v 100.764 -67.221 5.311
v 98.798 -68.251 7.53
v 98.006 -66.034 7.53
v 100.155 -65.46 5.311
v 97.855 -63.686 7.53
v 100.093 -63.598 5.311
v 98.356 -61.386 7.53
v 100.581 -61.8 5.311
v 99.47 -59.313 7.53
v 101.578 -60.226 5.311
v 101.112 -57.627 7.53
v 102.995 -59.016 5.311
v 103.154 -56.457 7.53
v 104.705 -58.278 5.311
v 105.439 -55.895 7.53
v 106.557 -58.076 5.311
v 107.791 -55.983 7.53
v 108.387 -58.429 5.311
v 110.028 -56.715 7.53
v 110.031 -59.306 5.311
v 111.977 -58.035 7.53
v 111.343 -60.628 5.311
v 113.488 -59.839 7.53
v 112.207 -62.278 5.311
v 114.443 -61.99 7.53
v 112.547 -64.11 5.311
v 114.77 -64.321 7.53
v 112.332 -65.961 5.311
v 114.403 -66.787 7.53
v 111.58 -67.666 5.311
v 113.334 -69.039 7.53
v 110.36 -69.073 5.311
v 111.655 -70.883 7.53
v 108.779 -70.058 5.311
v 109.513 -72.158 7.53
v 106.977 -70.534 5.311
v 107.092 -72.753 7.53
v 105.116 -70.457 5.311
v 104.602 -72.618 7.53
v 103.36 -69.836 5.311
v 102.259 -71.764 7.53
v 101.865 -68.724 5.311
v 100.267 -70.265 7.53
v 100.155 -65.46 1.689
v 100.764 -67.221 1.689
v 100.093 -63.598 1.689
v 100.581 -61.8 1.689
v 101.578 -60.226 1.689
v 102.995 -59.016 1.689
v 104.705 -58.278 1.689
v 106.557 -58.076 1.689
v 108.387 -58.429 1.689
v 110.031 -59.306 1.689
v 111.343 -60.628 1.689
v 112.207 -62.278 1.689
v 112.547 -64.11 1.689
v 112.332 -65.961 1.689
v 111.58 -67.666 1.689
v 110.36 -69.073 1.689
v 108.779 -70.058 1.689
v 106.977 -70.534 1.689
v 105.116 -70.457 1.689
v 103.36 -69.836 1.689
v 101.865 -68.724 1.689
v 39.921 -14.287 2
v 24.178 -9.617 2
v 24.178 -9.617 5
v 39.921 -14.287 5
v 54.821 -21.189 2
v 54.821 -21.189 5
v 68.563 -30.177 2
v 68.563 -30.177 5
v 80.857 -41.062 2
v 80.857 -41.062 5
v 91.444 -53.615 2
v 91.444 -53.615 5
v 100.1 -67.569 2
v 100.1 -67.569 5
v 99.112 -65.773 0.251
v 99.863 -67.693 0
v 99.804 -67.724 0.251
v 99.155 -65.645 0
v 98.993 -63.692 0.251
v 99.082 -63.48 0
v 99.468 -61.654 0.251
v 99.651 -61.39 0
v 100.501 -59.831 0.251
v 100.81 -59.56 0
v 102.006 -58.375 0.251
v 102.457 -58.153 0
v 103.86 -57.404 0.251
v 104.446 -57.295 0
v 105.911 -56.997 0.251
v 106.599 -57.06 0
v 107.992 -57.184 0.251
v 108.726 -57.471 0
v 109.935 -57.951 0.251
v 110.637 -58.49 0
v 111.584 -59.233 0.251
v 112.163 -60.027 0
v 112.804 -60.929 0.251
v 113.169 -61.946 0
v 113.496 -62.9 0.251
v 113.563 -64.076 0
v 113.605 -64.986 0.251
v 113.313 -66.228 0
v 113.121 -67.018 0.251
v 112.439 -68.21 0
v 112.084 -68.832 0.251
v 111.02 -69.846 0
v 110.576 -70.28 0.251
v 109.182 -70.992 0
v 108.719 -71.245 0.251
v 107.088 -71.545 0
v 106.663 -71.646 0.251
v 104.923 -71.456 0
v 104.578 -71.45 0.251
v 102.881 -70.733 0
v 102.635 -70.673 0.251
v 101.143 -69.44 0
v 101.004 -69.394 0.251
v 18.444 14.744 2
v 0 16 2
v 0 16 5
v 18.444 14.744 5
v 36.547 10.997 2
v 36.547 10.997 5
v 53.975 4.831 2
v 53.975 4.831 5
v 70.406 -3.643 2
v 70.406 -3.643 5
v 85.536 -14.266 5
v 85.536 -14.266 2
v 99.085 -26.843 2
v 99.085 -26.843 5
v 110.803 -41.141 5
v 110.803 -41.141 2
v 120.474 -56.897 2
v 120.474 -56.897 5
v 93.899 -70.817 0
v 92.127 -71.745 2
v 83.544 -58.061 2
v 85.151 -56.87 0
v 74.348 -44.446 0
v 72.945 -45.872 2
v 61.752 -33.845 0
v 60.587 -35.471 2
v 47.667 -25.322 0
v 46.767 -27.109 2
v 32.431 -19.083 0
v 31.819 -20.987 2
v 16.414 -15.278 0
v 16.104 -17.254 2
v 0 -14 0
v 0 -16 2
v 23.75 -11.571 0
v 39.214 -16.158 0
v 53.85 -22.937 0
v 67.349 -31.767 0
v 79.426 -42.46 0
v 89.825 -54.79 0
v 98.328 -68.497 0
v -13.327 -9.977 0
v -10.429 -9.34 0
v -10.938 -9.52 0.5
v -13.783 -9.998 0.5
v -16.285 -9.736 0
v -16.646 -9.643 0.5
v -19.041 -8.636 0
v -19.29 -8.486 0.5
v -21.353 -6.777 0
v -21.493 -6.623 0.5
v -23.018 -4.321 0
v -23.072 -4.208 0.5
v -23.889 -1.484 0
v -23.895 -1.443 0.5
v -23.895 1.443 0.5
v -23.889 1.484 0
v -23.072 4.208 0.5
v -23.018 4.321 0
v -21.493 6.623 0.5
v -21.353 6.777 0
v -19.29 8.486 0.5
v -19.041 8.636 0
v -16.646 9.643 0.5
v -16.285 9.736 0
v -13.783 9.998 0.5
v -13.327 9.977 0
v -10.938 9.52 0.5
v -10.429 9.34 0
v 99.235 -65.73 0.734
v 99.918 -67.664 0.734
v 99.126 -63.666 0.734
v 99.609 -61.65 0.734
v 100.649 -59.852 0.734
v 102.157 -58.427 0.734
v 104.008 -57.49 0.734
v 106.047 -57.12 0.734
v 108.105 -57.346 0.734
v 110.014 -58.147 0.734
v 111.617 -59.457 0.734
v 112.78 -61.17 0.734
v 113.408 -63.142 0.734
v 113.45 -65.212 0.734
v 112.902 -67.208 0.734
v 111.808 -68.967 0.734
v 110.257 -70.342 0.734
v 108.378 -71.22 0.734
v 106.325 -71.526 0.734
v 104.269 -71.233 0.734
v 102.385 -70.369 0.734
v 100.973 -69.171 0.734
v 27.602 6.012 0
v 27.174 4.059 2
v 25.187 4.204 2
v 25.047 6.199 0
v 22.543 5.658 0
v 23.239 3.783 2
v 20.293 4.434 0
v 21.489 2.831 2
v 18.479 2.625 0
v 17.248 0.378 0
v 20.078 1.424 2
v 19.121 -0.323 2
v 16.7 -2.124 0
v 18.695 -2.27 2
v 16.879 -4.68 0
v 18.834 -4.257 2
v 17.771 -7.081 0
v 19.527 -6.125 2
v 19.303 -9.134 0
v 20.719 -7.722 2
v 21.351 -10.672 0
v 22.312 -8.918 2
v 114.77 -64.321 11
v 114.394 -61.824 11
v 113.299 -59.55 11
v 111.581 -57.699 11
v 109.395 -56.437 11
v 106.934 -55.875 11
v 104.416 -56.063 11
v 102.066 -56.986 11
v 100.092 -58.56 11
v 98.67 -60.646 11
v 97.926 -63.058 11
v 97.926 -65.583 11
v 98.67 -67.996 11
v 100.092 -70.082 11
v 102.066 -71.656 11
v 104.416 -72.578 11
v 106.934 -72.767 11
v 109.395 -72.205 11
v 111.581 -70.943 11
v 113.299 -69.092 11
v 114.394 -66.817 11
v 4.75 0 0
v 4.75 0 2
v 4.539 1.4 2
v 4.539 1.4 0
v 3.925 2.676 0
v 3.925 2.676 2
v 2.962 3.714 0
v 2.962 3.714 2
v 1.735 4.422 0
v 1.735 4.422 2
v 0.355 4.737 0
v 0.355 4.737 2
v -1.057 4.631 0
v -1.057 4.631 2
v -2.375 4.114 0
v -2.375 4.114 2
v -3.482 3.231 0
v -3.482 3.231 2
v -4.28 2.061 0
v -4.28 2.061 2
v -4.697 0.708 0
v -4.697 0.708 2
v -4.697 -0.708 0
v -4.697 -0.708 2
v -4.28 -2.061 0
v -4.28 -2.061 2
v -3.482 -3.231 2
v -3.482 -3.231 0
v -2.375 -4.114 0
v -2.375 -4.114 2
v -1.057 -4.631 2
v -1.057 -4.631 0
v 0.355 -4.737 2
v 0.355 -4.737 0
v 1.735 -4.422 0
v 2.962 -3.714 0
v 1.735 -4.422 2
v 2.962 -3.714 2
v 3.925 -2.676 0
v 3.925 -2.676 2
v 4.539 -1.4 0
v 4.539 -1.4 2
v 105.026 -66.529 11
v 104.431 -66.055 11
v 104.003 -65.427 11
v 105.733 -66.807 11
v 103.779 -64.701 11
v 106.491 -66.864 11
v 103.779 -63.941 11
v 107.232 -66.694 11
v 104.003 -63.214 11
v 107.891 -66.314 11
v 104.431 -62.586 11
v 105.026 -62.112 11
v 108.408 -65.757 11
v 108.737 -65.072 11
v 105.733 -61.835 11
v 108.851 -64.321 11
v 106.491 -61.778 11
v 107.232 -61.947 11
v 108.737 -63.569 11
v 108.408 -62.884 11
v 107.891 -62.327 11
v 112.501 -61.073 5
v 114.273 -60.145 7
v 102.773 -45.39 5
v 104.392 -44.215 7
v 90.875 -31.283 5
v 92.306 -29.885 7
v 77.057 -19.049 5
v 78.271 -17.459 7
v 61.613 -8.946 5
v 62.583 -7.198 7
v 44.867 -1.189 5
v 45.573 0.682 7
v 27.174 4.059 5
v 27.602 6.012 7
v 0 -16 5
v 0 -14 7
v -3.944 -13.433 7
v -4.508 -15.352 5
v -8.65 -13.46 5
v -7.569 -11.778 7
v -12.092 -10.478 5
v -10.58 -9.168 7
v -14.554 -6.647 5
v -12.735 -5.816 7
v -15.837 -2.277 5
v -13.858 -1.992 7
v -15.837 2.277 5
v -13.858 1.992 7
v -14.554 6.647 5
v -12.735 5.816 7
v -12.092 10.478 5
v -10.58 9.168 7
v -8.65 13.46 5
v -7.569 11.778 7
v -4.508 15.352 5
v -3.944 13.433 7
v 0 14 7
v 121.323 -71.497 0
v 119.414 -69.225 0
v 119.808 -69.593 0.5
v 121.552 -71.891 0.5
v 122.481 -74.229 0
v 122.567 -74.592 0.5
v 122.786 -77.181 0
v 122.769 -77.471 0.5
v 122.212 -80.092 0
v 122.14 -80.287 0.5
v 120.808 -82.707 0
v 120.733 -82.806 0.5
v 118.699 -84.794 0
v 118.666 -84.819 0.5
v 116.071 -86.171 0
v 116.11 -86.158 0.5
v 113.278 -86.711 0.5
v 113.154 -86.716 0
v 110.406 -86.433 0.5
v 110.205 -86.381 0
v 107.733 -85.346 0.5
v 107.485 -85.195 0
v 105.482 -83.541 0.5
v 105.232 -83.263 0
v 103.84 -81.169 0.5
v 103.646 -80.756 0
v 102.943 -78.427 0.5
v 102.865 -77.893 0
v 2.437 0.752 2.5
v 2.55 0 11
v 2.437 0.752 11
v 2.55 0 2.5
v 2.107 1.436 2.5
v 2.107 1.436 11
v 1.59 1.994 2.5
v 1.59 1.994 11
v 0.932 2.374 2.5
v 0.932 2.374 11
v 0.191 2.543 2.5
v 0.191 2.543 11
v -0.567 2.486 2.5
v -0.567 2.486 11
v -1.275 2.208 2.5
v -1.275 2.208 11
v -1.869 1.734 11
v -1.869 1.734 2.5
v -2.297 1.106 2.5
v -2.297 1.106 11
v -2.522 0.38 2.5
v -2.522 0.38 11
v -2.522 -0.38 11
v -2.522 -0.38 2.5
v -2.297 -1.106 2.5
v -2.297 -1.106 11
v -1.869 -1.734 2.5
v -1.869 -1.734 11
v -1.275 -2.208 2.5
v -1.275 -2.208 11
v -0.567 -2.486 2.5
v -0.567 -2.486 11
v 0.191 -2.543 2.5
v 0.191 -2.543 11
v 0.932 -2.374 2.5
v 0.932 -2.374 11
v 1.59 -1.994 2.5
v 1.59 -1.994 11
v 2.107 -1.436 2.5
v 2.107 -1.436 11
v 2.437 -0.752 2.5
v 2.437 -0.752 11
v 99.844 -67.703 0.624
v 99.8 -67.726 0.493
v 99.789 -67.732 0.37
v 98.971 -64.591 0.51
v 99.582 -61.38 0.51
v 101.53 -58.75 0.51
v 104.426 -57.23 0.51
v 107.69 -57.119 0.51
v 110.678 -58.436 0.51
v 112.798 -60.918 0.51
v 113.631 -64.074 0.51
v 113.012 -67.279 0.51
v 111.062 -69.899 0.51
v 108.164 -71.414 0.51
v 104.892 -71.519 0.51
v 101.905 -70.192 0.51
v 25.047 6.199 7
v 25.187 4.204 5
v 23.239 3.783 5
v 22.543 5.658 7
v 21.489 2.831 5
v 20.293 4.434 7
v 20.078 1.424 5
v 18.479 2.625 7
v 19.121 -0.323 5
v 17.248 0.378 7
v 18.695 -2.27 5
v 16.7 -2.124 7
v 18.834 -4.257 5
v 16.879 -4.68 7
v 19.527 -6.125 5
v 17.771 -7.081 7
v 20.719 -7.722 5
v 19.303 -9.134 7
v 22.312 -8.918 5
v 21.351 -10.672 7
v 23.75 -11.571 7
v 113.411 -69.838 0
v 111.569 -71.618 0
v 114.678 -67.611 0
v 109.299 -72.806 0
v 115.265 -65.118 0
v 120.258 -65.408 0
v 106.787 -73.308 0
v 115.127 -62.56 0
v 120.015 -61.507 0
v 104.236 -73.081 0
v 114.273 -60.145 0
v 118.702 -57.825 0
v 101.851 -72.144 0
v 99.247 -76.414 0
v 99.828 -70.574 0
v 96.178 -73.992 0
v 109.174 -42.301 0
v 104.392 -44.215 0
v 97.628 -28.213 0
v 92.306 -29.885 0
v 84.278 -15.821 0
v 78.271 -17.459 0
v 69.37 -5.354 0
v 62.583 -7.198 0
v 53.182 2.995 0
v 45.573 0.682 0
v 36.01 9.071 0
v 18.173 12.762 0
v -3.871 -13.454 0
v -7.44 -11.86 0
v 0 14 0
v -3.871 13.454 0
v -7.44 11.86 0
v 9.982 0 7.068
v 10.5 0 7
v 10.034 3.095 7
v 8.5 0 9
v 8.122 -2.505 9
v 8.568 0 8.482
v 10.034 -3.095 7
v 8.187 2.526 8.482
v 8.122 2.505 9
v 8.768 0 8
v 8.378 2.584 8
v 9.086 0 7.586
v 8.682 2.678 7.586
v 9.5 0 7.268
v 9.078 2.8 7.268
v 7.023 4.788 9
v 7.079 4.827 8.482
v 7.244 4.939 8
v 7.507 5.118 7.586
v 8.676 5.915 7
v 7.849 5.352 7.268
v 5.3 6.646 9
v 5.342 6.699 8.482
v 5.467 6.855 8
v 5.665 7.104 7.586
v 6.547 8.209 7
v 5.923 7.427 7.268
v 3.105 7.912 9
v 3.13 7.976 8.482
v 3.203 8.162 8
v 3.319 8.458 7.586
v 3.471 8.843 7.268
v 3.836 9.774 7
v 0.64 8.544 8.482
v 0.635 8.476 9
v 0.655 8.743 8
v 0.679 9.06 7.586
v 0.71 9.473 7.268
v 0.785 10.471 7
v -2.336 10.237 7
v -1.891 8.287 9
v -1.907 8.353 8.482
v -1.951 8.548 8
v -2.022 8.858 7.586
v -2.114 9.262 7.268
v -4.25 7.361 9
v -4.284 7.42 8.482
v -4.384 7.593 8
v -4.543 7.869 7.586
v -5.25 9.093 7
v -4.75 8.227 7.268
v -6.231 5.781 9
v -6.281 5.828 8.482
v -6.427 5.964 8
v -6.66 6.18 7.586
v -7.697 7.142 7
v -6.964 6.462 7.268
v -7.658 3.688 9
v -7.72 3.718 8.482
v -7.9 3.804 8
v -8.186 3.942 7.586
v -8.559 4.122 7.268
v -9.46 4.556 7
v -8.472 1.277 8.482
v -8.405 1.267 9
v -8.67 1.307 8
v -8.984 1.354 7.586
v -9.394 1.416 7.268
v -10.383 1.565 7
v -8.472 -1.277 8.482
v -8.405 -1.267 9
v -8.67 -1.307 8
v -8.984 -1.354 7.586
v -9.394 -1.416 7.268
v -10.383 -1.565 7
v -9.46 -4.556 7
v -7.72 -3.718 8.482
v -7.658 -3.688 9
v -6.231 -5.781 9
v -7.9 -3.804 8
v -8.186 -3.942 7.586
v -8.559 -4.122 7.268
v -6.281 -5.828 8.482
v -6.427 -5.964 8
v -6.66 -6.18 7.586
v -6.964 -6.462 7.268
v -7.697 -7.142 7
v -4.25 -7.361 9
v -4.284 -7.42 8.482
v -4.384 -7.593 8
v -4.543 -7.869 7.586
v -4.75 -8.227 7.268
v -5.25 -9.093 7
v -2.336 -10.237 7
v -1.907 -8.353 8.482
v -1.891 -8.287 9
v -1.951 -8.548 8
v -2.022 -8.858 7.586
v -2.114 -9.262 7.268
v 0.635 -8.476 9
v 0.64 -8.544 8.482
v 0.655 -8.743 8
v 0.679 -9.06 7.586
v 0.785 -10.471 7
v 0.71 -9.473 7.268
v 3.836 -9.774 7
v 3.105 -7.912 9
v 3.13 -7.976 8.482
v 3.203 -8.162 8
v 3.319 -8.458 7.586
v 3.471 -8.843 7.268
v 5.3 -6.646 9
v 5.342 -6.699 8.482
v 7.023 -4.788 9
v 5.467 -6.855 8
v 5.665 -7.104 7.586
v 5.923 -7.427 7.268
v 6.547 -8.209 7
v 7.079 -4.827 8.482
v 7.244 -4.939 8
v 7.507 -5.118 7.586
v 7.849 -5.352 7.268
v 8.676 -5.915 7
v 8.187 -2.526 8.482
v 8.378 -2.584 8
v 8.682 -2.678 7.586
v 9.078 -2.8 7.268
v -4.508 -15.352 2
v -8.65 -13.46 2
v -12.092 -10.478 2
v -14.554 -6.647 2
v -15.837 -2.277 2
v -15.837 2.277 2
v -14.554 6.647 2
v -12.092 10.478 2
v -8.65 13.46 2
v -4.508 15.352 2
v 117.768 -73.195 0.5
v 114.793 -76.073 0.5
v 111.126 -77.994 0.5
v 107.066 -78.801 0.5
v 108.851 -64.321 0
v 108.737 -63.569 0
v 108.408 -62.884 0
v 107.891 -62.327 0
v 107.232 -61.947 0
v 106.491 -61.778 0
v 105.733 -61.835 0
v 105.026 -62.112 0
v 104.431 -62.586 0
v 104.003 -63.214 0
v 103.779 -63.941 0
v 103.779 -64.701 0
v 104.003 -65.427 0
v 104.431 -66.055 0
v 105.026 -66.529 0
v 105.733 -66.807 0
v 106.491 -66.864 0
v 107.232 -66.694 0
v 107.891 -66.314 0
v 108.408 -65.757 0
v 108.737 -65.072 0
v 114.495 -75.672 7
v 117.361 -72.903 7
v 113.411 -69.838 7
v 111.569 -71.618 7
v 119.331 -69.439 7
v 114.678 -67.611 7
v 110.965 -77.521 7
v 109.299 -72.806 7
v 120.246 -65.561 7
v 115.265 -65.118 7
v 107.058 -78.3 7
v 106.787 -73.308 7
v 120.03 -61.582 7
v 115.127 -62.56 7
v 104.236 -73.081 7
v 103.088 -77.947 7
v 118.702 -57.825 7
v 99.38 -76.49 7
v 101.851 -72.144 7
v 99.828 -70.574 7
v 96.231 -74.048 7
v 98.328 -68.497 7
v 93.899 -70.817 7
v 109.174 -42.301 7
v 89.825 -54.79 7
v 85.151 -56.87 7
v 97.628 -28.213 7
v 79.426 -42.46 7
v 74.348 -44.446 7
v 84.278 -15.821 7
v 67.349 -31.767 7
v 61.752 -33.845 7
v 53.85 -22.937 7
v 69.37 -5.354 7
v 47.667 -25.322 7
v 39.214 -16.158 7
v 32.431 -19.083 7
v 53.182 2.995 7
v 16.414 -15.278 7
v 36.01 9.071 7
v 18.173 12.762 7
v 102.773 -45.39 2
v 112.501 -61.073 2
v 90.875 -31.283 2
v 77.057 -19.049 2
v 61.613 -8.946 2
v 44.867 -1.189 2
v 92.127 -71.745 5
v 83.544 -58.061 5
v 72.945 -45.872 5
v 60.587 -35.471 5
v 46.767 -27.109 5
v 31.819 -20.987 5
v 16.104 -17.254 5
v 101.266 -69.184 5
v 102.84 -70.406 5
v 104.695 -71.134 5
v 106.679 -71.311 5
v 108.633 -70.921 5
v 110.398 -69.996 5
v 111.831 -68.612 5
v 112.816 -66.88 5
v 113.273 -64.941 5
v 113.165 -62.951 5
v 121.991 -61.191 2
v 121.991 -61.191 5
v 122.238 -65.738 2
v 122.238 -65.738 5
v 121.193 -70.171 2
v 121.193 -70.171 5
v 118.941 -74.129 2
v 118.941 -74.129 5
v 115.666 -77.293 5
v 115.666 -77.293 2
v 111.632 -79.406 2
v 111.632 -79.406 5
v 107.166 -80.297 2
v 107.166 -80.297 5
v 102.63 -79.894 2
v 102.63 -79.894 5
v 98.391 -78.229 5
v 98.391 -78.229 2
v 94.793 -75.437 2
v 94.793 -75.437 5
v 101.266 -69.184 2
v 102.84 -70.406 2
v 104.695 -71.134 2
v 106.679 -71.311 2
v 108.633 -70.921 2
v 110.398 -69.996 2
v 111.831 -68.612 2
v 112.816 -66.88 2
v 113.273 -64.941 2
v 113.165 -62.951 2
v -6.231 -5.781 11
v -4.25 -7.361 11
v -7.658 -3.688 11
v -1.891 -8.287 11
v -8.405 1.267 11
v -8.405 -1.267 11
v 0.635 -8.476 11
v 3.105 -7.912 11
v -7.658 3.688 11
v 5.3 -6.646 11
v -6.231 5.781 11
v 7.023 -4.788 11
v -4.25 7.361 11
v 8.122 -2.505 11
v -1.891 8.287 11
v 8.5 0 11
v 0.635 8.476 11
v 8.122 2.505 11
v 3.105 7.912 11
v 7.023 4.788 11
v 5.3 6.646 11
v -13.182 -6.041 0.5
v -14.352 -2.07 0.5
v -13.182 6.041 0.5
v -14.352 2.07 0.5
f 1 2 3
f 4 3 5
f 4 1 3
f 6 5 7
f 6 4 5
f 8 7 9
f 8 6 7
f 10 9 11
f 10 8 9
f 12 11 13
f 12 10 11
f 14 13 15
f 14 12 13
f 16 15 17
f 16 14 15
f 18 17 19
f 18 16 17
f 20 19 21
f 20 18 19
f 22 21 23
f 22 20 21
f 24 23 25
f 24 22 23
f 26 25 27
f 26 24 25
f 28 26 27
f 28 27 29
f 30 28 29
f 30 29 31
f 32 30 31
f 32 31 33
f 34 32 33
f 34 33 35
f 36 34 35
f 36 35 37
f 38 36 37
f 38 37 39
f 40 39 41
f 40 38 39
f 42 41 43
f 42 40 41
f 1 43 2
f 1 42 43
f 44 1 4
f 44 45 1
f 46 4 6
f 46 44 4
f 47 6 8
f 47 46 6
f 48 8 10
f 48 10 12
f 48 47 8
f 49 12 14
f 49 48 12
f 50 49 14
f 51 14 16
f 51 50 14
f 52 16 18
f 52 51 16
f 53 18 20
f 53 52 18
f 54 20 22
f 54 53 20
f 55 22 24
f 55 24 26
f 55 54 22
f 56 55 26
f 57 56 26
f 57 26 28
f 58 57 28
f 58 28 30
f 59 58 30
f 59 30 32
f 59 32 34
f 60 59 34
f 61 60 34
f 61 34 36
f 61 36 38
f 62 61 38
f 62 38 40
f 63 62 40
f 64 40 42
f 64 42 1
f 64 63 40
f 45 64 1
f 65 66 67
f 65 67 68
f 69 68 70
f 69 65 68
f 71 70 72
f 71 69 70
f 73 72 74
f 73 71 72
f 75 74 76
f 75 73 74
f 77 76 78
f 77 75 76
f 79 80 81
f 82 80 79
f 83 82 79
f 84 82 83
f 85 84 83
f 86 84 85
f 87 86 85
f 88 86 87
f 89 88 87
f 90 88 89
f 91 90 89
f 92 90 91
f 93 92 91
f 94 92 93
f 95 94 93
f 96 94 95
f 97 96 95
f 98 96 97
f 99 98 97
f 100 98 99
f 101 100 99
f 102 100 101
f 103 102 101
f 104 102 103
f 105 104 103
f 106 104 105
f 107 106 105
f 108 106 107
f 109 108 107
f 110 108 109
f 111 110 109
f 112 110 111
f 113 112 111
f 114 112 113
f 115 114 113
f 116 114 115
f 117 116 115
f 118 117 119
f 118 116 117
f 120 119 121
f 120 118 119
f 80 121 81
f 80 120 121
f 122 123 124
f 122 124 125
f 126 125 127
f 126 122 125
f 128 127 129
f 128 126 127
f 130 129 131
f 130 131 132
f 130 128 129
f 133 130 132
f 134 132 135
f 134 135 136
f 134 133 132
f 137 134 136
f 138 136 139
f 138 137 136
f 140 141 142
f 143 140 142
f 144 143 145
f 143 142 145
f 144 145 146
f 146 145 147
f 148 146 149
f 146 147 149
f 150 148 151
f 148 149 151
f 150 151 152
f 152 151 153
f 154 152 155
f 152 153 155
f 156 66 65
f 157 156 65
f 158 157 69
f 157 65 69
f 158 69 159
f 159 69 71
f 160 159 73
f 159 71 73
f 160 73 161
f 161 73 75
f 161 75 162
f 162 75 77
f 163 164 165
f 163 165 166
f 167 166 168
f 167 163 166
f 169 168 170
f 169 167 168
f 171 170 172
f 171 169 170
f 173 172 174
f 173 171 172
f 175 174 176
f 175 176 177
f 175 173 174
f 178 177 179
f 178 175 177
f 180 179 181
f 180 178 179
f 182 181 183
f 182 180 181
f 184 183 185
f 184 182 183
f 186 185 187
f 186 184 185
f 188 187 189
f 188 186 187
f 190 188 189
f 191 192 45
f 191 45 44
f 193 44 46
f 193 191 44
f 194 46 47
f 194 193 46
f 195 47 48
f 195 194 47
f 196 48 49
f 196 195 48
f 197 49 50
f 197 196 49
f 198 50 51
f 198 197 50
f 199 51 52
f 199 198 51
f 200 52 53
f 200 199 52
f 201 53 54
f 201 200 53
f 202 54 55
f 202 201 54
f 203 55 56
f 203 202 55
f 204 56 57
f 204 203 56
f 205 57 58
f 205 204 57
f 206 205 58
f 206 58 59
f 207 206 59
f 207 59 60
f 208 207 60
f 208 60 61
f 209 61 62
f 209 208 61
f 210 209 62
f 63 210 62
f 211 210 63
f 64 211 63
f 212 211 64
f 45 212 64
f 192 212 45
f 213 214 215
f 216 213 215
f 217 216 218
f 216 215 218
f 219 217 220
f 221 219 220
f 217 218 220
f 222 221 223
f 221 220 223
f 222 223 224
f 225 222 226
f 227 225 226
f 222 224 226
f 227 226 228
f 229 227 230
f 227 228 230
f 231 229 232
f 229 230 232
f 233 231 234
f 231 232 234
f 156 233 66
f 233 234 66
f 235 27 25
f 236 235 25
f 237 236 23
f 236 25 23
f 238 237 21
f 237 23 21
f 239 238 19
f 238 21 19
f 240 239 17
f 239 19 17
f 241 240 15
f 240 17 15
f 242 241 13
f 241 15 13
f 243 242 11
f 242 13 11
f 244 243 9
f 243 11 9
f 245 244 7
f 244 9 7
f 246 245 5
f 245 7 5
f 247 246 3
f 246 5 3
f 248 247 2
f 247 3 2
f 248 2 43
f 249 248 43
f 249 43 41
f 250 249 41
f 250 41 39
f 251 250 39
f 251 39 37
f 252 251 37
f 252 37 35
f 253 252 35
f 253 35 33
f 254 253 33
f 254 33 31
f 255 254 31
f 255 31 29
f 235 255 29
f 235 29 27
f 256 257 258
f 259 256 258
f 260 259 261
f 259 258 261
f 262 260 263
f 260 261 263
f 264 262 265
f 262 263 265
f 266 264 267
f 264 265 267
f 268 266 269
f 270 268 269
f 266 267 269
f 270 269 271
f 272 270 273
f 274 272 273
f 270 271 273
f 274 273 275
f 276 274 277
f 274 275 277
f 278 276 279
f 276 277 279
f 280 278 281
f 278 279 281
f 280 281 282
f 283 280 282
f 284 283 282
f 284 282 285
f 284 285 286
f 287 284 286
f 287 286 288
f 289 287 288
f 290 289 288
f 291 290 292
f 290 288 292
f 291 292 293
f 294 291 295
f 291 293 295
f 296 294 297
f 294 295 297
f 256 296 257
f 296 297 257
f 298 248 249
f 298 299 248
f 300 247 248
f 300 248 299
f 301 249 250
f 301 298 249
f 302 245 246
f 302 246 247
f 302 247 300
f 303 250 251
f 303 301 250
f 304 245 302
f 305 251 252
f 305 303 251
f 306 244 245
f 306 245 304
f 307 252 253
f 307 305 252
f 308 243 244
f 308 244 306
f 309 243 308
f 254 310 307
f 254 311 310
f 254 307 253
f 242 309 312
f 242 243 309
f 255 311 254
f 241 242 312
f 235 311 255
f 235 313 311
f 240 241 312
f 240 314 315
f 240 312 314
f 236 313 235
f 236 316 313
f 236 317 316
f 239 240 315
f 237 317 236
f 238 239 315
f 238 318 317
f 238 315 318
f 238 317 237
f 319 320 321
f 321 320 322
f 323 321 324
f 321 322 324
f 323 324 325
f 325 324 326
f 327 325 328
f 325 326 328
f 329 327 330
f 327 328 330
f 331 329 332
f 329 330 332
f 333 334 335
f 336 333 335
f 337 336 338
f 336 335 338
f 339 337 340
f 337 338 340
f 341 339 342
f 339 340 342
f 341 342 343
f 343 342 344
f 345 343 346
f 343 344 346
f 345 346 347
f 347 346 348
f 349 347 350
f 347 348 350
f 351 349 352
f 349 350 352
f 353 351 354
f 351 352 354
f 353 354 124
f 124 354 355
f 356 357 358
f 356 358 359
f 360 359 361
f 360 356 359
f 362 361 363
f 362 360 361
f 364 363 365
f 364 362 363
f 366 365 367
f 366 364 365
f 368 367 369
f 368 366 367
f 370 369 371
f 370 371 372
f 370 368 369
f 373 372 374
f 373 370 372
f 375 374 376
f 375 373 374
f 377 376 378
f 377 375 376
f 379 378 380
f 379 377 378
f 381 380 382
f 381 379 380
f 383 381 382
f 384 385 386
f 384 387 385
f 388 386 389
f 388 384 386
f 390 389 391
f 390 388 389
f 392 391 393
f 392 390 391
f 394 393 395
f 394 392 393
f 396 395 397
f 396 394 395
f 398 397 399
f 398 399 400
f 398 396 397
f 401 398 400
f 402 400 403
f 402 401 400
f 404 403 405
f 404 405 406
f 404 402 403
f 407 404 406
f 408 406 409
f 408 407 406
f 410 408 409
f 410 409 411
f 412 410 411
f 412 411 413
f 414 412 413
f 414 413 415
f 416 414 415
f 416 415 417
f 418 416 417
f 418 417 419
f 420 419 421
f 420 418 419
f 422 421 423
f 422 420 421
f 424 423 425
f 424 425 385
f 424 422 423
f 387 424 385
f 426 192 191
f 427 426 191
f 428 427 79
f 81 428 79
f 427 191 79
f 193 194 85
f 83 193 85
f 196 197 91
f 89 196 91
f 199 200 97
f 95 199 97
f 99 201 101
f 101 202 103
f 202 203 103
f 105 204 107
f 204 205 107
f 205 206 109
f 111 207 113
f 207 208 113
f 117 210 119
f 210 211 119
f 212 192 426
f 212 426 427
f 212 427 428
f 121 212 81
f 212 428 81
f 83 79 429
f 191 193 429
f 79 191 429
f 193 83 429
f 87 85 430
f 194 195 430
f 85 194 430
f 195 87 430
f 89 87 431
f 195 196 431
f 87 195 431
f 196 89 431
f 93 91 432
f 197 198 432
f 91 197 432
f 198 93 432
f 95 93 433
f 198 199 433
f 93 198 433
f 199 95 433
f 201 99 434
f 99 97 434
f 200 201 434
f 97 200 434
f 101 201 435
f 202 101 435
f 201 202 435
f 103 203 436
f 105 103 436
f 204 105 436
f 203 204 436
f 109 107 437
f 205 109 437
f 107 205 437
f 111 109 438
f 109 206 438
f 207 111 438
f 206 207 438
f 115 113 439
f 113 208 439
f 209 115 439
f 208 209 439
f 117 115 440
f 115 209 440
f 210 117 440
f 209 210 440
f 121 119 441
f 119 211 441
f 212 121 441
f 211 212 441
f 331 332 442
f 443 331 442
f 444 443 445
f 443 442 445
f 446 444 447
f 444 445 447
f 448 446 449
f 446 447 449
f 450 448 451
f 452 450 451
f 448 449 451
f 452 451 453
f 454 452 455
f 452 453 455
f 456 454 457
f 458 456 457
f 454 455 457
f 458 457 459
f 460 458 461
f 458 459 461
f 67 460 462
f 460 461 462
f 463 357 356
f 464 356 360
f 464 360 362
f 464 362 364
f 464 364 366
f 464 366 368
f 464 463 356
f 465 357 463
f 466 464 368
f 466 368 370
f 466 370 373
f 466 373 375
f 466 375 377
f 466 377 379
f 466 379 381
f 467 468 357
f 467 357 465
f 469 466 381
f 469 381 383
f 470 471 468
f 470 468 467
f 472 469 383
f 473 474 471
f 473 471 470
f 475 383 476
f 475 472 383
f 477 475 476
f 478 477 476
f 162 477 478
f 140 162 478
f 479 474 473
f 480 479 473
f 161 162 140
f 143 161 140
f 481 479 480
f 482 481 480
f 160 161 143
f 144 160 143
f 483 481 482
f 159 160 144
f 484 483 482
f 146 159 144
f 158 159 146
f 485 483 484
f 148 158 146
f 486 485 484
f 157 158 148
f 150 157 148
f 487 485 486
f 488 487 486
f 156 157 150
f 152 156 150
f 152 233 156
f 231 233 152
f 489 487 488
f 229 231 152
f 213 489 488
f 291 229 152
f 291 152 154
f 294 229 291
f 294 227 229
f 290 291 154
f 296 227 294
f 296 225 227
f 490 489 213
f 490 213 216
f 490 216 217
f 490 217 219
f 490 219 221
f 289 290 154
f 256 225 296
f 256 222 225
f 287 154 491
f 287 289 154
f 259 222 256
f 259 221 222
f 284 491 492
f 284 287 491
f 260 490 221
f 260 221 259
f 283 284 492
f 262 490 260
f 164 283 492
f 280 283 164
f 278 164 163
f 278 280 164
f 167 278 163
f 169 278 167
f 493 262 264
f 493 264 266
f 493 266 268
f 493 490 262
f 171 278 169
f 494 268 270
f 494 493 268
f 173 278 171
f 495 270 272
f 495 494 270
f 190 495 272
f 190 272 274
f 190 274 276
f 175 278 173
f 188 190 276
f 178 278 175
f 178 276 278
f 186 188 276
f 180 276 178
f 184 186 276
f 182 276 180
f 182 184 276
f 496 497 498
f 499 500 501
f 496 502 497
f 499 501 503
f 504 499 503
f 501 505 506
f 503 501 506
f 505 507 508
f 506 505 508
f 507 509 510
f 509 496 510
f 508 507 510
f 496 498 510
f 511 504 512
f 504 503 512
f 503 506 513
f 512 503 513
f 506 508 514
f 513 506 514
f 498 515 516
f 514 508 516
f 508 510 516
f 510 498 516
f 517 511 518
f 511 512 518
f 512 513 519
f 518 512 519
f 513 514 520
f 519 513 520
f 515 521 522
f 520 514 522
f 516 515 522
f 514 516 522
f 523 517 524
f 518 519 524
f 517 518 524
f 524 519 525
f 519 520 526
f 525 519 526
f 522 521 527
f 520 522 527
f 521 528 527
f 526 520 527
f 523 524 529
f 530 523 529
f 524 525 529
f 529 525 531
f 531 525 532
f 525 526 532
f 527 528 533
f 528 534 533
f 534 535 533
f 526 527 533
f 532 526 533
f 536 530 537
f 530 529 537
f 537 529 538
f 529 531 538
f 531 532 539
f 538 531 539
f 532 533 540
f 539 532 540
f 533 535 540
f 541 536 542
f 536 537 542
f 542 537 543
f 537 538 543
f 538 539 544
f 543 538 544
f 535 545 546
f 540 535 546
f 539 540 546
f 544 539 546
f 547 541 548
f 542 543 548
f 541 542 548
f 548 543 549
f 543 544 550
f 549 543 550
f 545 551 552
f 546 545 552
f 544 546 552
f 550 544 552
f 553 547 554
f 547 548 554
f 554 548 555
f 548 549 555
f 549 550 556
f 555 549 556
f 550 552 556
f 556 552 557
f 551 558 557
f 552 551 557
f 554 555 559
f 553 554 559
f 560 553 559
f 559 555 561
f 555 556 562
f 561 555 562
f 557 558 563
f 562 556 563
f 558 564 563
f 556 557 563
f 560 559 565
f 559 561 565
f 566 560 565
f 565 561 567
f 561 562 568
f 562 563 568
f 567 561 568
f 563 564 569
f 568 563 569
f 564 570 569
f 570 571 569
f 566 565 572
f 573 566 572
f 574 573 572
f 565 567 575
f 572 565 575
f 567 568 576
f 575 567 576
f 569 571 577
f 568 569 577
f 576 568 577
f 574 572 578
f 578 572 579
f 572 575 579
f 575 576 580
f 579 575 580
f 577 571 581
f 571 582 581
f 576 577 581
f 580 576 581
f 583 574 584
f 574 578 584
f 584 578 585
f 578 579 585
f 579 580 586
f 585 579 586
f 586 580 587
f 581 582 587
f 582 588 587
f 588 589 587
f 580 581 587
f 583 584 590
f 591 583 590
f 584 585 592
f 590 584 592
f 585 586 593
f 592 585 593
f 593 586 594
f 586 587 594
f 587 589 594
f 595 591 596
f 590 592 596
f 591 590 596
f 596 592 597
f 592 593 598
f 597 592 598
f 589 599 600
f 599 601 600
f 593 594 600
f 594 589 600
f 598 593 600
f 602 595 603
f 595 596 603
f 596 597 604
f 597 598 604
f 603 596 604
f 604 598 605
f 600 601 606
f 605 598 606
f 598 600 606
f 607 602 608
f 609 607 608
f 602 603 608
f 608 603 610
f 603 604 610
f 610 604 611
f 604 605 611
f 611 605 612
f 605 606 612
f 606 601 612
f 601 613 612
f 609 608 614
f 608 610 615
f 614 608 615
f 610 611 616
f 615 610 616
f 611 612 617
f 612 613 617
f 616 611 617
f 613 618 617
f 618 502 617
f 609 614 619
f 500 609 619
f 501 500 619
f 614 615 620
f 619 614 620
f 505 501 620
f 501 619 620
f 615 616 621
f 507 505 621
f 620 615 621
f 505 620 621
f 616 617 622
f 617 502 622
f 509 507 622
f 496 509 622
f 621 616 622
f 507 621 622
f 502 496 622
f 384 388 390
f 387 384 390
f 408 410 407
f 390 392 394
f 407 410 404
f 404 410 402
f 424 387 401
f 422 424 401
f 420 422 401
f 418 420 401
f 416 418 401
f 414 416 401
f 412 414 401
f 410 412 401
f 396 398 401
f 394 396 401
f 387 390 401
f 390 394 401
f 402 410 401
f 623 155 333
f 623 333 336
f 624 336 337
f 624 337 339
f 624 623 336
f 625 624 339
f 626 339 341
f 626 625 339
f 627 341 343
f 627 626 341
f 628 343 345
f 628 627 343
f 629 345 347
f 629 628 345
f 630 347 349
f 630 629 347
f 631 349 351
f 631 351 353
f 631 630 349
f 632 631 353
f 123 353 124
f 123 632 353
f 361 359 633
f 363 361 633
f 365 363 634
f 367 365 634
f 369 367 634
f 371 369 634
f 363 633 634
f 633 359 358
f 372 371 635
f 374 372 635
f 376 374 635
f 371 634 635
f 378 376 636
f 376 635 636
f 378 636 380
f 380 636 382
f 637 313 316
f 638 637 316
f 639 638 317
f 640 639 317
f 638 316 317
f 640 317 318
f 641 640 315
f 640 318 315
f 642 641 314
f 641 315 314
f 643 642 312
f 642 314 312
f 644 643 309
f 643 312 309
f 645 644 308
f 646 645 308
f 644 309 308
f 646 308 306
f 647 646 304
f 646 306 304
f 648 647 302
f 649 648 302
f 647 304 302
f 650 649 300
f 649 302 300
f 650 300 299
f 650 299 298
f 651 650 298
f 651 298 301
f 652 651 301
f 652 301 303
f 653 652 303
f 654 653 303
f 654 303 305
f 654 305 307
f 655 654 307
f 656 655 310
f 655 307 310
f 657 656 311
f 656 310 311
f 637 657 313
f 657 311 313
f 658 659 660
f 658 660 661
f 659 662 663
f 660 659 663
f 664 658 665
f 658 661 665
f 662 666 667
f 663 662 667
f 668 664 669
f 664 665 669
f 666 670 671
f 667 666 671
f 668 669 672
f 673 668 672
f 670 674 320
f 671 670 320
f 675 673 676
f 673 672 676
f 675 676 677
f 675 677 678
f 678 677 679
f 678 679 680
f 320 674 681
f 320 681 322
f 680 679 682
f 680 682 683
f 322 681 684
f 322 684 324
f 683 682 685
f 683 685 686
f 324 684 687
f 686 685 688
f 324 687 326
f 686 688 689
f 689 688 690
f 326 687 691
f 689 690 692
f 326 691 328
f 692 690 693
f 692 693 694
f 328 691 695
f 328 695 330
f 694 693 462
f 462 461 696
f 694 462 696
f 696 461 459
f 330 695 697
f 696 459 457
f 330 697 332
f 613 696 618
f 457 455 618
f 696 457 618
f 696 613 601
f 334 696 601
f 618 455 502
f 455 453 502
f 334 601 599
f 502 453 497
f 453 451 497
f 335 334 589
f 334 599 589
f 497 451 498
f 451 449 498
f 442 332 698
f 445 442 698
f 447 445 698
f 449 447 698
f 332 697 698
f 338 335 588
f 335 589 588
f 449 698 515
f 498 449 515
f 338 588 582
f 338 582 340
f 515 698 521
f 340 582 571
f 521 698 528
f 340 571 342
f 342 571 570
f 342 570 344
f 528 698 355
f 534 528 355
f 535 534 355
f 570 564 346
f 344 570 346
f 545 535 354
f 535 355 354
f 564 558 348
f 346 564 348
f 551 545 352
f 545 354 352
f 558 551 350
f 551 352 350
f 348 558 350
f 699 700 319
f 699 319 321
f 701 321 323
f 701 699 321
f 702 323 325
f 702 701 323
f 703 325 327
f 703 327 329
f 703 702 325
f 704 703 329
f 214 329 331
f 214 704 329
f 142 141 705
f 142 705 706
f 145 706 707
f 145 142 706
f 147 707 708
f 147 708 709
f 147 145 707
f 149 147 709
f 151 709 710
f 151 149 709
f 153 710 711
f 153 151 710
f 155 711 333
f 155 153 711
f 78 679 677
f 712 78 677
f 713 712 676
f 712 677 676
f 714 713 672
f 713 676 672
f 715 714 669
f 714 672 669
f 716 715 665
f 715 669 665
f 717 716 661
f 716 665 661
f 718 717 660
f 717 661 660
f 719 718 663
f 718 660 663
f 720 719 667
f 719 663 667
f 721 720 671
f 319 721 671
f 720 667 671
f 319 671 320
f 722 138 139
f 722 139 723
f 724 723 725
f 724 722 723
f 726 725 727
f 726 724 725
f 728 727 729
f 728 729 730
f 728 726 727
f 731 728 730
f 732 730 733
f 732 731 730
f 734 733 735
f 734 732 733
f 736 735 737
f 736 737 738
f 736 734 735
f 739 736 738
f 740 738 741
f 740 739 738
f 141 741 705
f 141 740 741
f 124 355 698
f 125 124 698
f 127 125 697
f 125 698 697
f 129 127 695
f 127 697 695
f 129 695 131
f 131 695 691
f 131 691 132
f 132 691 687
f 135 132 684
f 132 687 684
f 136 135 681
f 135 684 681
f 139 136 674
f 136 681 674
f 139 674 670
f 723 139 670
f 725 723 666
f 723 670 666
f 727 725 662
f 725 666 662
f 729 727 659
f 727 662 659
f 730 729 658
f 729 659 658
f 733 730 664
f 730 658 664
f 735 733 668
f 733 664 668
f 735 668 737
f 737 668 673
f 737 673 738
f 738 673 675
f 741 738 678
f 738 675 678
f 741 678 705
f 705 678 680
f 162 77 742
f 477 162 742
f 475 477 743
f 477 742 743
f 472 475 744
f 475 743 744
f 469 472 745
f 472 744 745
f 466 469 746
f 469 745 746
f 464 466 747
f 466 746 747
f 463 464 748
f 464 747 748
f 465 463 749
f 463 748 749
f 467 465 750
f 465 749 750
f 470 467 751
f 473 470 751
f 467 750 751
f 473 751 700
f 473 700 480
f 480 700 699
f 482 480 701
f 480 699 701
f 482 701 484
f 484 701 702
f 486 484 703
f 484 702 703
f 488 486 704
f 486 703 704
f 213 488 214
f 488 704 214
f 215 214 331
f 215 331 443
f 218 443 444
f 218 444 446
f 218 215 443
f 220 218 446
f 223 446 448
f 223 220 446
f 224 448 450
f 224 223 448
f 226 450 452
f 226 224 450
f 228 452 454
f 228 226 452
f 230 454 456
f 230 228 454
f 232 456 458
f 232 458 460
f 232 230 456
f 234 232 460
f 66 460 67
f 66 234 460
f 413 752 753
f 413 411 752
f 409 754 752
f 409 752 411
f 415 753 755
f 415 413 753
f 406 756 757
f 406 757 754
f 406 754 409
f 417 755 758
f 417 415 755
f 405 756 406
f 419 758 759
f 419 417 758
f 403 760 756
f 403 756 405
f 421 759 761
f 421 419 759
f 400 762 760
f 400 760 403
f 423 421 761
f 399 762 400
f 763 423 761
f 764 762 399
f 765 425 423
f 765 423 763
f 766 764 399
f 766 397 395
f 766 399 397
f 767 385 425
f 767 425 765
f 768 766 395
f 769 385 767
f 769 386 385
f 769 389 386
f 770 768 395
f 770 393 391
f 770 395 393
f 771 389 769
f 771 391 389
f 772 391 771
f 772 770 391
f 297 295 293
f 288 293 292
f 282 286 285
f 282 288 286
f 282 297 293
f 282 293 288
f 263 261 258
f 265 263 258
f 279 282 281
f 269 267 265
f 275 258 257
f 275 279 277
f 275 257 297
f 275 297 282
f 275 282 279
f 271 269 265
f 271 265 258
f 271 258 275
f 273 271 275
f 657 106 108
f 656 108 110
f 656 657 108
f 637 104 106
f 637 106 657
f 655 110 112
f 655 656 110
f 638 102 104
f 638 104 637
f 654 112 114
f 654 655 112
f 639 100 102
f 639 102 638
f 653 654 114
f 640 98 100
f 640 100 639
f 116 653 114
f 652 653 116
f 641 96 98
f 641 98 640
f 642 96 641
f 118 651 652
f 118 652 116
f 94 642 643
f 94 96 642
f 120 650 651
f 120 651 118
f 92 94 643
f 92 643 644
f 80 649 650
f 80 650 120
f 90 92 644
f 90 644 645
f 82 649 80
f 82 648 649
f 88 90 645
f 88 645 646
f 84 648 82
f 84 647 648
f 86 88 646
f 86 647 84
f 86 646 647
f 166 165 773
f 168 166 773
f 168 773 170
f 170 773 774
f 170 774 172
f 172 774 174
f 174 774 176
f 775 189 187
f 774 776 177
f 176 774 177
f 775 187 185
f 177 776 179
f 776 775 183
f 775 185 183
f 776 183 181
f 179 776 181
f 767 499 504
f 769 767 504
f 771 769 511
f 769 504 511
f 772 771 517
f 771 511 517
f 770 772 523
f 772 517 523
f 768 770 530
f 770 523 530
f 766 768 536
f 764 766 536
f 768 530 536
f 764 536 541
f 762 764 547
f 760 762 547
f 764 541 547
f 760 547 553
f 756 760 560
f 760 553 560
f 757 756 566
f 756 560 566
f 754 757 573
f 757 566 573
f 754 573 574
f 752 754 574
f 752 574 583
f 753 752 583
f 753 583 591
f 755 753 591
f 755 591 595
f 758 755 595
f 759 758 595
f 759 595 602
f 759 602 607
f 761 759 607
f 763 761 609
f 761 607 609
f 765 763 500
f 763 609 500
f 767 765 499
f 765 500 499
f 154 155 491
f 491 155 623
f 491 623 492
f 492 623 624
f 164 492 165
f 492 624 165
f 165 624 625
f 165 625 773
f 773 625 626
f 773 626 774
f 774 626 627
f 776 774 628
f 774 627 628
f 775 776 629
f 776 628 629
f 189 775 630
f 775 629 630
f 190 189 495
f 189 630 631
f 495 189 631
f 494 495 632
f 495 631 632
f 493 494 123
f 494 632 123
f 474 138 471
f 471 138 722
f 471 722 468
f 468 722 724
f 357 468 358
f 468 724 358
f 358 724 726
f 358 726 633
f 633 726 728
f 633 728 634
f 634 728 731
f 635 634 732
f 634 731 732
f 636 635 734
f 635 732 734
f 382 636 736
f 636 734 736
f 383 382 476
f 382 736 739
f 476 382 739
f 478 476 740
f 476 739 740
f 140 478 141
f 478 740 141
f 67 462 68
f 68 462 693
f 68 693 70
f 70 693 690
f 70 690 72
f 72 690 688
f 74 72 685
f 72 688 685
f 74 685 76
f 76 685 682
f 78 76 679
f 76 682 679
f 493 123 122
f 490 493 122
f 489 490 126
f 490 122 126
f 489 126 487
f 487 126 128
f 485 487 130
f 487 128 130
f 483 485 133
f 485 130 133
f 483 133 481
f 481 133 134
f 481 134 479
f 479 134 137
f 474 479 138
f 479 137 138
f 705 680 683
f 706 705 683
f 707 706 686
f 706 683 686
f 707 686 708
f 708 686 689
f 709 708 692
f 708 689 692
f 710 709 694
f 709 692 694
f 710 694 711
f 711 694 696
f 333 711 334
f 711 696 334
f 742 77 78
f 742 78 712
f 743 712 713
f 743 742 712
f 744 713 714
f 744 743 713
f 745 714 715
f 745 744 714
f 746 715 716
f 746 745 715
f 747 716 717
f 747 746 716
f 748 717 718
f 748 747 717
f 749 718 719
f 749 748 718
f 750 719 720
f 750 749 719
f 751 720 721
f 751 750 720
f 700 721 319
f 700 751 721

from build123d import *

# Parameters (mm, degrees)
SKETCH1_R           = 8.5
SKETCH1_R_2         = 2.55
BOSS_EXTRUDE1_DEPTH = 7
BOSS_EXTRUDE2_START = 7
SKETCH1_3_R         = 8.5
SKETCH1_3_R_2       = 2.55
BOSS_EXTRUDE2_DEPTH = 4
CHAMFER1_SIZE       = 2
FILLET2_R           = 2
CUT_EXTRUDE1_START  = -9
SKETCH2_R           = 4.75
CUT_EXTRUDE1_DEPTH  = 2
CHAMFER2_SIZE       = 0.75
CHAMFER2_SIZE2      = 0.672431604
FILLET3_R           = 0.5
SKETCH4_R           = 8.469669914
BOSS_EXTRUDE4_DEPTH = 3.46967
SKETCH5_R           = 2.55
CUT_EXTRUDE2_DEPTH  = 11
SKETCH7_R           = 2.55
BOSS_EXTRUDE5_DEPTH = 0.5
BOSS_EXTRUDE6_DEPTH = 0.5


with BuildPart() as part:
    # Sketch1 → Boss-Extrude1 (new body)
    with BuildSketch(Plane.XY):
        with BuildLine():
            ThreePointArc((92.127210642, -71.744668074), (53.839787702, -31.020916727), (0, -16))
            ThreePointArc((0, -16), (-16, 0), (0, 16))
            ThreePointArc((0, 16), (70.405876226, -3.642737258), (120.474044686, -56.896873635))
            ThreePointArc((120.474044686, -56.896873635), (113.724524883, -78.494187876), (92.127210642, -71.744668074))
        make_face()
        Circle(SKETCH1_R, mode=Mode.SUBTRACT)
        with BuildLine():
            ThreePointArc((112.501497611, -61.072815821), (77.057279191, -19.048646747), (27.173726746, 4.058810952))
            ThreePointArc((27.173726746, 4.058810952), (18.838075062, -1.2813118), (24.178197814, -9.616963484))
            ThreePointArc((24.178197814, -9.616963484), (68.562775973, -30.177142381), (100.099757717, -67.568725888))
            ThreePointArc((100.099757717, -67.568725888), (109.548582697, -70.521640801), (112.501497611, -61.072815821))
        make_face(mode=Mode.SUBTRACT)
        Circle(SKETCH1_R)
        Circle(SKETCH1_R_2, mode=Mode.SUBTRACT)
    extrude(amount=BOSS_EXTRUDE1_DEPTH)

    # Sketch1<3> → Boss-Extrude2 (add)
    with BuildSketch(Plane.XY.offset(BOSS_EXTRUDE2_START)):
        Circle(SKETCH1_3_R)
        Circle(SKETCH1_3_R_2, mode=Mode.SUBTRACT)
    extrude(amount=BOSS_EXTRUDE2_DEPTH)

    # Chamfer1
    chamfer1_edges = [part.edges().sort_by_distance(p)[0] for p in [
        (113.724524883, -78.494187876, 7),
        (18.838075062, -1.2813118, 0),
        (68.562775973, -30.177142381, 0),
        (109.548582697, -70.521640801, 0),
        (77.057279191, -19.048646747, 0),
        (-16, 0, 0),
        (70.405876226, -3.642737258, 0),
        (113.724524883, -78.494187876, 0),
        (70.405876226, -3.642737258, 7),
        (53.839787702, -31.020916727, 0),
        (-16, 0, 7),
        (77.057279191, -19.048646747, 7),
        (109.548582697, -70.521640801, 7),
        (68.562775973, -30.177142381, 7),
        (18.838075062, -1.2813118, 7),
        (53.839787702, -31.020916727, 7),
    ]]
    chamfer(chamfer1_edges, length=CHAMFER1_SIZE)

    # Fillet2
    fillet2_edges = [part.edges().sort_by_distance(p)[0] for p in [
        (-8.5, 0, 7),
    ]]
    fillet(fillet2_edges, radius=FILLET2_R)

    # Sketch2 → Cut-Extrude1 (cut)
    with BuildSketch(Plane.XY.offset(11).offset(CUT_EXTRUDE1_START)):
        Circle(SKETCH2_R)
    extrude(amount=-CUT_EXTRUDE1_DEPTH, mode=Mode.SUBTRACT)

    # Sketch7 → Boss-Extrude5 (add)
    with BuildSketch(Plane(origin=(0, 0, 2), x_dir=(-1, 0, 0), z_dir=(0, 0, -1))):
        Circle(SKETCH7_R)
    extrude(amount=-BOSS_EXTRUDE5_DEPTH)

    # Sketch8 → Boss-Extrude6 (add)
    with BuildSketch(Plane(origin=(0, 0, 0), x_dir=(-1, 0, 0), z_dir=(0, 0, -1))):
        with BuildLine():
            ThreePointArc((10.428571429, -9.340497736), (24, 0), (10.428571429, 9.340497736))
            ThreePointArc((10.428571429, 9.340497736), (14, 0), (10.428571429, -9.340497736))
        make_face()
        with BuildLine():
            ThreePointArc((-119.413590916, -69.224870643), (-117.436473493, -85.580896387), (-102.865244715, -77.89273254))
            ThreePointArc((-102.865244715, -77.89273254), (-112.796537731, -76.722510748), (-119.413590916, -69.224870643))
        make_face()
    extrude(amount=-BOSS_EXTRUDE6_DEPTH)


with BuildPart() as body_2:
    # Sketch3 → Revolve1 (revolve)
    with BuildSketch(Plane(origin=(49.322808384, -94.165195348, 0), x_dir=(-0.885838564, -0.463993576, 0), z_dir=(0.463993576, -0.885838564, 0))):
        Polygon((-55.85110094, -7.530330086), (-58.070770854, -5.310660172), (-58.070770854, -1.689339828), (-56.381431026, 0), (-64.320770854, 0), (-64.320770854, -7.530330086), align=None)
    revolve(axis=Axis((106.300627664, -64.320770854, 5), (0, 0, -1)))

    # Chamfer2
    chamfer2_edges = [body_2.edges().sort_by_distance(p)[0] for p in [
        (113.333601055, -60.636968174, 0),
    ]]
    chamfer2_side = [body_2.faces().sort_by_distance(p)[0] for p in [
        (112.585359872, -61.028889589, 0.844669914),
    ]]
    chamfer(chamfer2_edges, length=CHAMFER2_SIZE, length2=CHAMFER2_SIZE2, reference=chamfer2_side[0])

    # Fillet3
    fillet3_edges = [body_2.edges().sort_by_distance(p)[0] for p in [
        (112.863814214, -60.883037928, 0.530330086),
    ]]
    fillet(fillet3_edges, radius=FILLET3_R)

    # Sketch4 → Boss-Extrude4 (add)
    with BuildSketch(Plane.XY.offset(7.530330086)):
        with Locations((106.300627664, -64.320770854)):
            Circle(SKETCH4_R)
    extrude(amount=BOSS_EXTRUDE4_DEPTH)

    # Sketch5 → Cut-Extrude2 (cut)
    with BuildSketch(Plane.XY.offset(11)):
        with Locations((106.300627664, -64.320770854)):
            Circle(SKETCH5_R)
    extrude(amount=-CUT_EXTRUDE2_DEPTH, mode=Mode.SUBTRACT)


solid = Compound([part.part, body_2.part])
